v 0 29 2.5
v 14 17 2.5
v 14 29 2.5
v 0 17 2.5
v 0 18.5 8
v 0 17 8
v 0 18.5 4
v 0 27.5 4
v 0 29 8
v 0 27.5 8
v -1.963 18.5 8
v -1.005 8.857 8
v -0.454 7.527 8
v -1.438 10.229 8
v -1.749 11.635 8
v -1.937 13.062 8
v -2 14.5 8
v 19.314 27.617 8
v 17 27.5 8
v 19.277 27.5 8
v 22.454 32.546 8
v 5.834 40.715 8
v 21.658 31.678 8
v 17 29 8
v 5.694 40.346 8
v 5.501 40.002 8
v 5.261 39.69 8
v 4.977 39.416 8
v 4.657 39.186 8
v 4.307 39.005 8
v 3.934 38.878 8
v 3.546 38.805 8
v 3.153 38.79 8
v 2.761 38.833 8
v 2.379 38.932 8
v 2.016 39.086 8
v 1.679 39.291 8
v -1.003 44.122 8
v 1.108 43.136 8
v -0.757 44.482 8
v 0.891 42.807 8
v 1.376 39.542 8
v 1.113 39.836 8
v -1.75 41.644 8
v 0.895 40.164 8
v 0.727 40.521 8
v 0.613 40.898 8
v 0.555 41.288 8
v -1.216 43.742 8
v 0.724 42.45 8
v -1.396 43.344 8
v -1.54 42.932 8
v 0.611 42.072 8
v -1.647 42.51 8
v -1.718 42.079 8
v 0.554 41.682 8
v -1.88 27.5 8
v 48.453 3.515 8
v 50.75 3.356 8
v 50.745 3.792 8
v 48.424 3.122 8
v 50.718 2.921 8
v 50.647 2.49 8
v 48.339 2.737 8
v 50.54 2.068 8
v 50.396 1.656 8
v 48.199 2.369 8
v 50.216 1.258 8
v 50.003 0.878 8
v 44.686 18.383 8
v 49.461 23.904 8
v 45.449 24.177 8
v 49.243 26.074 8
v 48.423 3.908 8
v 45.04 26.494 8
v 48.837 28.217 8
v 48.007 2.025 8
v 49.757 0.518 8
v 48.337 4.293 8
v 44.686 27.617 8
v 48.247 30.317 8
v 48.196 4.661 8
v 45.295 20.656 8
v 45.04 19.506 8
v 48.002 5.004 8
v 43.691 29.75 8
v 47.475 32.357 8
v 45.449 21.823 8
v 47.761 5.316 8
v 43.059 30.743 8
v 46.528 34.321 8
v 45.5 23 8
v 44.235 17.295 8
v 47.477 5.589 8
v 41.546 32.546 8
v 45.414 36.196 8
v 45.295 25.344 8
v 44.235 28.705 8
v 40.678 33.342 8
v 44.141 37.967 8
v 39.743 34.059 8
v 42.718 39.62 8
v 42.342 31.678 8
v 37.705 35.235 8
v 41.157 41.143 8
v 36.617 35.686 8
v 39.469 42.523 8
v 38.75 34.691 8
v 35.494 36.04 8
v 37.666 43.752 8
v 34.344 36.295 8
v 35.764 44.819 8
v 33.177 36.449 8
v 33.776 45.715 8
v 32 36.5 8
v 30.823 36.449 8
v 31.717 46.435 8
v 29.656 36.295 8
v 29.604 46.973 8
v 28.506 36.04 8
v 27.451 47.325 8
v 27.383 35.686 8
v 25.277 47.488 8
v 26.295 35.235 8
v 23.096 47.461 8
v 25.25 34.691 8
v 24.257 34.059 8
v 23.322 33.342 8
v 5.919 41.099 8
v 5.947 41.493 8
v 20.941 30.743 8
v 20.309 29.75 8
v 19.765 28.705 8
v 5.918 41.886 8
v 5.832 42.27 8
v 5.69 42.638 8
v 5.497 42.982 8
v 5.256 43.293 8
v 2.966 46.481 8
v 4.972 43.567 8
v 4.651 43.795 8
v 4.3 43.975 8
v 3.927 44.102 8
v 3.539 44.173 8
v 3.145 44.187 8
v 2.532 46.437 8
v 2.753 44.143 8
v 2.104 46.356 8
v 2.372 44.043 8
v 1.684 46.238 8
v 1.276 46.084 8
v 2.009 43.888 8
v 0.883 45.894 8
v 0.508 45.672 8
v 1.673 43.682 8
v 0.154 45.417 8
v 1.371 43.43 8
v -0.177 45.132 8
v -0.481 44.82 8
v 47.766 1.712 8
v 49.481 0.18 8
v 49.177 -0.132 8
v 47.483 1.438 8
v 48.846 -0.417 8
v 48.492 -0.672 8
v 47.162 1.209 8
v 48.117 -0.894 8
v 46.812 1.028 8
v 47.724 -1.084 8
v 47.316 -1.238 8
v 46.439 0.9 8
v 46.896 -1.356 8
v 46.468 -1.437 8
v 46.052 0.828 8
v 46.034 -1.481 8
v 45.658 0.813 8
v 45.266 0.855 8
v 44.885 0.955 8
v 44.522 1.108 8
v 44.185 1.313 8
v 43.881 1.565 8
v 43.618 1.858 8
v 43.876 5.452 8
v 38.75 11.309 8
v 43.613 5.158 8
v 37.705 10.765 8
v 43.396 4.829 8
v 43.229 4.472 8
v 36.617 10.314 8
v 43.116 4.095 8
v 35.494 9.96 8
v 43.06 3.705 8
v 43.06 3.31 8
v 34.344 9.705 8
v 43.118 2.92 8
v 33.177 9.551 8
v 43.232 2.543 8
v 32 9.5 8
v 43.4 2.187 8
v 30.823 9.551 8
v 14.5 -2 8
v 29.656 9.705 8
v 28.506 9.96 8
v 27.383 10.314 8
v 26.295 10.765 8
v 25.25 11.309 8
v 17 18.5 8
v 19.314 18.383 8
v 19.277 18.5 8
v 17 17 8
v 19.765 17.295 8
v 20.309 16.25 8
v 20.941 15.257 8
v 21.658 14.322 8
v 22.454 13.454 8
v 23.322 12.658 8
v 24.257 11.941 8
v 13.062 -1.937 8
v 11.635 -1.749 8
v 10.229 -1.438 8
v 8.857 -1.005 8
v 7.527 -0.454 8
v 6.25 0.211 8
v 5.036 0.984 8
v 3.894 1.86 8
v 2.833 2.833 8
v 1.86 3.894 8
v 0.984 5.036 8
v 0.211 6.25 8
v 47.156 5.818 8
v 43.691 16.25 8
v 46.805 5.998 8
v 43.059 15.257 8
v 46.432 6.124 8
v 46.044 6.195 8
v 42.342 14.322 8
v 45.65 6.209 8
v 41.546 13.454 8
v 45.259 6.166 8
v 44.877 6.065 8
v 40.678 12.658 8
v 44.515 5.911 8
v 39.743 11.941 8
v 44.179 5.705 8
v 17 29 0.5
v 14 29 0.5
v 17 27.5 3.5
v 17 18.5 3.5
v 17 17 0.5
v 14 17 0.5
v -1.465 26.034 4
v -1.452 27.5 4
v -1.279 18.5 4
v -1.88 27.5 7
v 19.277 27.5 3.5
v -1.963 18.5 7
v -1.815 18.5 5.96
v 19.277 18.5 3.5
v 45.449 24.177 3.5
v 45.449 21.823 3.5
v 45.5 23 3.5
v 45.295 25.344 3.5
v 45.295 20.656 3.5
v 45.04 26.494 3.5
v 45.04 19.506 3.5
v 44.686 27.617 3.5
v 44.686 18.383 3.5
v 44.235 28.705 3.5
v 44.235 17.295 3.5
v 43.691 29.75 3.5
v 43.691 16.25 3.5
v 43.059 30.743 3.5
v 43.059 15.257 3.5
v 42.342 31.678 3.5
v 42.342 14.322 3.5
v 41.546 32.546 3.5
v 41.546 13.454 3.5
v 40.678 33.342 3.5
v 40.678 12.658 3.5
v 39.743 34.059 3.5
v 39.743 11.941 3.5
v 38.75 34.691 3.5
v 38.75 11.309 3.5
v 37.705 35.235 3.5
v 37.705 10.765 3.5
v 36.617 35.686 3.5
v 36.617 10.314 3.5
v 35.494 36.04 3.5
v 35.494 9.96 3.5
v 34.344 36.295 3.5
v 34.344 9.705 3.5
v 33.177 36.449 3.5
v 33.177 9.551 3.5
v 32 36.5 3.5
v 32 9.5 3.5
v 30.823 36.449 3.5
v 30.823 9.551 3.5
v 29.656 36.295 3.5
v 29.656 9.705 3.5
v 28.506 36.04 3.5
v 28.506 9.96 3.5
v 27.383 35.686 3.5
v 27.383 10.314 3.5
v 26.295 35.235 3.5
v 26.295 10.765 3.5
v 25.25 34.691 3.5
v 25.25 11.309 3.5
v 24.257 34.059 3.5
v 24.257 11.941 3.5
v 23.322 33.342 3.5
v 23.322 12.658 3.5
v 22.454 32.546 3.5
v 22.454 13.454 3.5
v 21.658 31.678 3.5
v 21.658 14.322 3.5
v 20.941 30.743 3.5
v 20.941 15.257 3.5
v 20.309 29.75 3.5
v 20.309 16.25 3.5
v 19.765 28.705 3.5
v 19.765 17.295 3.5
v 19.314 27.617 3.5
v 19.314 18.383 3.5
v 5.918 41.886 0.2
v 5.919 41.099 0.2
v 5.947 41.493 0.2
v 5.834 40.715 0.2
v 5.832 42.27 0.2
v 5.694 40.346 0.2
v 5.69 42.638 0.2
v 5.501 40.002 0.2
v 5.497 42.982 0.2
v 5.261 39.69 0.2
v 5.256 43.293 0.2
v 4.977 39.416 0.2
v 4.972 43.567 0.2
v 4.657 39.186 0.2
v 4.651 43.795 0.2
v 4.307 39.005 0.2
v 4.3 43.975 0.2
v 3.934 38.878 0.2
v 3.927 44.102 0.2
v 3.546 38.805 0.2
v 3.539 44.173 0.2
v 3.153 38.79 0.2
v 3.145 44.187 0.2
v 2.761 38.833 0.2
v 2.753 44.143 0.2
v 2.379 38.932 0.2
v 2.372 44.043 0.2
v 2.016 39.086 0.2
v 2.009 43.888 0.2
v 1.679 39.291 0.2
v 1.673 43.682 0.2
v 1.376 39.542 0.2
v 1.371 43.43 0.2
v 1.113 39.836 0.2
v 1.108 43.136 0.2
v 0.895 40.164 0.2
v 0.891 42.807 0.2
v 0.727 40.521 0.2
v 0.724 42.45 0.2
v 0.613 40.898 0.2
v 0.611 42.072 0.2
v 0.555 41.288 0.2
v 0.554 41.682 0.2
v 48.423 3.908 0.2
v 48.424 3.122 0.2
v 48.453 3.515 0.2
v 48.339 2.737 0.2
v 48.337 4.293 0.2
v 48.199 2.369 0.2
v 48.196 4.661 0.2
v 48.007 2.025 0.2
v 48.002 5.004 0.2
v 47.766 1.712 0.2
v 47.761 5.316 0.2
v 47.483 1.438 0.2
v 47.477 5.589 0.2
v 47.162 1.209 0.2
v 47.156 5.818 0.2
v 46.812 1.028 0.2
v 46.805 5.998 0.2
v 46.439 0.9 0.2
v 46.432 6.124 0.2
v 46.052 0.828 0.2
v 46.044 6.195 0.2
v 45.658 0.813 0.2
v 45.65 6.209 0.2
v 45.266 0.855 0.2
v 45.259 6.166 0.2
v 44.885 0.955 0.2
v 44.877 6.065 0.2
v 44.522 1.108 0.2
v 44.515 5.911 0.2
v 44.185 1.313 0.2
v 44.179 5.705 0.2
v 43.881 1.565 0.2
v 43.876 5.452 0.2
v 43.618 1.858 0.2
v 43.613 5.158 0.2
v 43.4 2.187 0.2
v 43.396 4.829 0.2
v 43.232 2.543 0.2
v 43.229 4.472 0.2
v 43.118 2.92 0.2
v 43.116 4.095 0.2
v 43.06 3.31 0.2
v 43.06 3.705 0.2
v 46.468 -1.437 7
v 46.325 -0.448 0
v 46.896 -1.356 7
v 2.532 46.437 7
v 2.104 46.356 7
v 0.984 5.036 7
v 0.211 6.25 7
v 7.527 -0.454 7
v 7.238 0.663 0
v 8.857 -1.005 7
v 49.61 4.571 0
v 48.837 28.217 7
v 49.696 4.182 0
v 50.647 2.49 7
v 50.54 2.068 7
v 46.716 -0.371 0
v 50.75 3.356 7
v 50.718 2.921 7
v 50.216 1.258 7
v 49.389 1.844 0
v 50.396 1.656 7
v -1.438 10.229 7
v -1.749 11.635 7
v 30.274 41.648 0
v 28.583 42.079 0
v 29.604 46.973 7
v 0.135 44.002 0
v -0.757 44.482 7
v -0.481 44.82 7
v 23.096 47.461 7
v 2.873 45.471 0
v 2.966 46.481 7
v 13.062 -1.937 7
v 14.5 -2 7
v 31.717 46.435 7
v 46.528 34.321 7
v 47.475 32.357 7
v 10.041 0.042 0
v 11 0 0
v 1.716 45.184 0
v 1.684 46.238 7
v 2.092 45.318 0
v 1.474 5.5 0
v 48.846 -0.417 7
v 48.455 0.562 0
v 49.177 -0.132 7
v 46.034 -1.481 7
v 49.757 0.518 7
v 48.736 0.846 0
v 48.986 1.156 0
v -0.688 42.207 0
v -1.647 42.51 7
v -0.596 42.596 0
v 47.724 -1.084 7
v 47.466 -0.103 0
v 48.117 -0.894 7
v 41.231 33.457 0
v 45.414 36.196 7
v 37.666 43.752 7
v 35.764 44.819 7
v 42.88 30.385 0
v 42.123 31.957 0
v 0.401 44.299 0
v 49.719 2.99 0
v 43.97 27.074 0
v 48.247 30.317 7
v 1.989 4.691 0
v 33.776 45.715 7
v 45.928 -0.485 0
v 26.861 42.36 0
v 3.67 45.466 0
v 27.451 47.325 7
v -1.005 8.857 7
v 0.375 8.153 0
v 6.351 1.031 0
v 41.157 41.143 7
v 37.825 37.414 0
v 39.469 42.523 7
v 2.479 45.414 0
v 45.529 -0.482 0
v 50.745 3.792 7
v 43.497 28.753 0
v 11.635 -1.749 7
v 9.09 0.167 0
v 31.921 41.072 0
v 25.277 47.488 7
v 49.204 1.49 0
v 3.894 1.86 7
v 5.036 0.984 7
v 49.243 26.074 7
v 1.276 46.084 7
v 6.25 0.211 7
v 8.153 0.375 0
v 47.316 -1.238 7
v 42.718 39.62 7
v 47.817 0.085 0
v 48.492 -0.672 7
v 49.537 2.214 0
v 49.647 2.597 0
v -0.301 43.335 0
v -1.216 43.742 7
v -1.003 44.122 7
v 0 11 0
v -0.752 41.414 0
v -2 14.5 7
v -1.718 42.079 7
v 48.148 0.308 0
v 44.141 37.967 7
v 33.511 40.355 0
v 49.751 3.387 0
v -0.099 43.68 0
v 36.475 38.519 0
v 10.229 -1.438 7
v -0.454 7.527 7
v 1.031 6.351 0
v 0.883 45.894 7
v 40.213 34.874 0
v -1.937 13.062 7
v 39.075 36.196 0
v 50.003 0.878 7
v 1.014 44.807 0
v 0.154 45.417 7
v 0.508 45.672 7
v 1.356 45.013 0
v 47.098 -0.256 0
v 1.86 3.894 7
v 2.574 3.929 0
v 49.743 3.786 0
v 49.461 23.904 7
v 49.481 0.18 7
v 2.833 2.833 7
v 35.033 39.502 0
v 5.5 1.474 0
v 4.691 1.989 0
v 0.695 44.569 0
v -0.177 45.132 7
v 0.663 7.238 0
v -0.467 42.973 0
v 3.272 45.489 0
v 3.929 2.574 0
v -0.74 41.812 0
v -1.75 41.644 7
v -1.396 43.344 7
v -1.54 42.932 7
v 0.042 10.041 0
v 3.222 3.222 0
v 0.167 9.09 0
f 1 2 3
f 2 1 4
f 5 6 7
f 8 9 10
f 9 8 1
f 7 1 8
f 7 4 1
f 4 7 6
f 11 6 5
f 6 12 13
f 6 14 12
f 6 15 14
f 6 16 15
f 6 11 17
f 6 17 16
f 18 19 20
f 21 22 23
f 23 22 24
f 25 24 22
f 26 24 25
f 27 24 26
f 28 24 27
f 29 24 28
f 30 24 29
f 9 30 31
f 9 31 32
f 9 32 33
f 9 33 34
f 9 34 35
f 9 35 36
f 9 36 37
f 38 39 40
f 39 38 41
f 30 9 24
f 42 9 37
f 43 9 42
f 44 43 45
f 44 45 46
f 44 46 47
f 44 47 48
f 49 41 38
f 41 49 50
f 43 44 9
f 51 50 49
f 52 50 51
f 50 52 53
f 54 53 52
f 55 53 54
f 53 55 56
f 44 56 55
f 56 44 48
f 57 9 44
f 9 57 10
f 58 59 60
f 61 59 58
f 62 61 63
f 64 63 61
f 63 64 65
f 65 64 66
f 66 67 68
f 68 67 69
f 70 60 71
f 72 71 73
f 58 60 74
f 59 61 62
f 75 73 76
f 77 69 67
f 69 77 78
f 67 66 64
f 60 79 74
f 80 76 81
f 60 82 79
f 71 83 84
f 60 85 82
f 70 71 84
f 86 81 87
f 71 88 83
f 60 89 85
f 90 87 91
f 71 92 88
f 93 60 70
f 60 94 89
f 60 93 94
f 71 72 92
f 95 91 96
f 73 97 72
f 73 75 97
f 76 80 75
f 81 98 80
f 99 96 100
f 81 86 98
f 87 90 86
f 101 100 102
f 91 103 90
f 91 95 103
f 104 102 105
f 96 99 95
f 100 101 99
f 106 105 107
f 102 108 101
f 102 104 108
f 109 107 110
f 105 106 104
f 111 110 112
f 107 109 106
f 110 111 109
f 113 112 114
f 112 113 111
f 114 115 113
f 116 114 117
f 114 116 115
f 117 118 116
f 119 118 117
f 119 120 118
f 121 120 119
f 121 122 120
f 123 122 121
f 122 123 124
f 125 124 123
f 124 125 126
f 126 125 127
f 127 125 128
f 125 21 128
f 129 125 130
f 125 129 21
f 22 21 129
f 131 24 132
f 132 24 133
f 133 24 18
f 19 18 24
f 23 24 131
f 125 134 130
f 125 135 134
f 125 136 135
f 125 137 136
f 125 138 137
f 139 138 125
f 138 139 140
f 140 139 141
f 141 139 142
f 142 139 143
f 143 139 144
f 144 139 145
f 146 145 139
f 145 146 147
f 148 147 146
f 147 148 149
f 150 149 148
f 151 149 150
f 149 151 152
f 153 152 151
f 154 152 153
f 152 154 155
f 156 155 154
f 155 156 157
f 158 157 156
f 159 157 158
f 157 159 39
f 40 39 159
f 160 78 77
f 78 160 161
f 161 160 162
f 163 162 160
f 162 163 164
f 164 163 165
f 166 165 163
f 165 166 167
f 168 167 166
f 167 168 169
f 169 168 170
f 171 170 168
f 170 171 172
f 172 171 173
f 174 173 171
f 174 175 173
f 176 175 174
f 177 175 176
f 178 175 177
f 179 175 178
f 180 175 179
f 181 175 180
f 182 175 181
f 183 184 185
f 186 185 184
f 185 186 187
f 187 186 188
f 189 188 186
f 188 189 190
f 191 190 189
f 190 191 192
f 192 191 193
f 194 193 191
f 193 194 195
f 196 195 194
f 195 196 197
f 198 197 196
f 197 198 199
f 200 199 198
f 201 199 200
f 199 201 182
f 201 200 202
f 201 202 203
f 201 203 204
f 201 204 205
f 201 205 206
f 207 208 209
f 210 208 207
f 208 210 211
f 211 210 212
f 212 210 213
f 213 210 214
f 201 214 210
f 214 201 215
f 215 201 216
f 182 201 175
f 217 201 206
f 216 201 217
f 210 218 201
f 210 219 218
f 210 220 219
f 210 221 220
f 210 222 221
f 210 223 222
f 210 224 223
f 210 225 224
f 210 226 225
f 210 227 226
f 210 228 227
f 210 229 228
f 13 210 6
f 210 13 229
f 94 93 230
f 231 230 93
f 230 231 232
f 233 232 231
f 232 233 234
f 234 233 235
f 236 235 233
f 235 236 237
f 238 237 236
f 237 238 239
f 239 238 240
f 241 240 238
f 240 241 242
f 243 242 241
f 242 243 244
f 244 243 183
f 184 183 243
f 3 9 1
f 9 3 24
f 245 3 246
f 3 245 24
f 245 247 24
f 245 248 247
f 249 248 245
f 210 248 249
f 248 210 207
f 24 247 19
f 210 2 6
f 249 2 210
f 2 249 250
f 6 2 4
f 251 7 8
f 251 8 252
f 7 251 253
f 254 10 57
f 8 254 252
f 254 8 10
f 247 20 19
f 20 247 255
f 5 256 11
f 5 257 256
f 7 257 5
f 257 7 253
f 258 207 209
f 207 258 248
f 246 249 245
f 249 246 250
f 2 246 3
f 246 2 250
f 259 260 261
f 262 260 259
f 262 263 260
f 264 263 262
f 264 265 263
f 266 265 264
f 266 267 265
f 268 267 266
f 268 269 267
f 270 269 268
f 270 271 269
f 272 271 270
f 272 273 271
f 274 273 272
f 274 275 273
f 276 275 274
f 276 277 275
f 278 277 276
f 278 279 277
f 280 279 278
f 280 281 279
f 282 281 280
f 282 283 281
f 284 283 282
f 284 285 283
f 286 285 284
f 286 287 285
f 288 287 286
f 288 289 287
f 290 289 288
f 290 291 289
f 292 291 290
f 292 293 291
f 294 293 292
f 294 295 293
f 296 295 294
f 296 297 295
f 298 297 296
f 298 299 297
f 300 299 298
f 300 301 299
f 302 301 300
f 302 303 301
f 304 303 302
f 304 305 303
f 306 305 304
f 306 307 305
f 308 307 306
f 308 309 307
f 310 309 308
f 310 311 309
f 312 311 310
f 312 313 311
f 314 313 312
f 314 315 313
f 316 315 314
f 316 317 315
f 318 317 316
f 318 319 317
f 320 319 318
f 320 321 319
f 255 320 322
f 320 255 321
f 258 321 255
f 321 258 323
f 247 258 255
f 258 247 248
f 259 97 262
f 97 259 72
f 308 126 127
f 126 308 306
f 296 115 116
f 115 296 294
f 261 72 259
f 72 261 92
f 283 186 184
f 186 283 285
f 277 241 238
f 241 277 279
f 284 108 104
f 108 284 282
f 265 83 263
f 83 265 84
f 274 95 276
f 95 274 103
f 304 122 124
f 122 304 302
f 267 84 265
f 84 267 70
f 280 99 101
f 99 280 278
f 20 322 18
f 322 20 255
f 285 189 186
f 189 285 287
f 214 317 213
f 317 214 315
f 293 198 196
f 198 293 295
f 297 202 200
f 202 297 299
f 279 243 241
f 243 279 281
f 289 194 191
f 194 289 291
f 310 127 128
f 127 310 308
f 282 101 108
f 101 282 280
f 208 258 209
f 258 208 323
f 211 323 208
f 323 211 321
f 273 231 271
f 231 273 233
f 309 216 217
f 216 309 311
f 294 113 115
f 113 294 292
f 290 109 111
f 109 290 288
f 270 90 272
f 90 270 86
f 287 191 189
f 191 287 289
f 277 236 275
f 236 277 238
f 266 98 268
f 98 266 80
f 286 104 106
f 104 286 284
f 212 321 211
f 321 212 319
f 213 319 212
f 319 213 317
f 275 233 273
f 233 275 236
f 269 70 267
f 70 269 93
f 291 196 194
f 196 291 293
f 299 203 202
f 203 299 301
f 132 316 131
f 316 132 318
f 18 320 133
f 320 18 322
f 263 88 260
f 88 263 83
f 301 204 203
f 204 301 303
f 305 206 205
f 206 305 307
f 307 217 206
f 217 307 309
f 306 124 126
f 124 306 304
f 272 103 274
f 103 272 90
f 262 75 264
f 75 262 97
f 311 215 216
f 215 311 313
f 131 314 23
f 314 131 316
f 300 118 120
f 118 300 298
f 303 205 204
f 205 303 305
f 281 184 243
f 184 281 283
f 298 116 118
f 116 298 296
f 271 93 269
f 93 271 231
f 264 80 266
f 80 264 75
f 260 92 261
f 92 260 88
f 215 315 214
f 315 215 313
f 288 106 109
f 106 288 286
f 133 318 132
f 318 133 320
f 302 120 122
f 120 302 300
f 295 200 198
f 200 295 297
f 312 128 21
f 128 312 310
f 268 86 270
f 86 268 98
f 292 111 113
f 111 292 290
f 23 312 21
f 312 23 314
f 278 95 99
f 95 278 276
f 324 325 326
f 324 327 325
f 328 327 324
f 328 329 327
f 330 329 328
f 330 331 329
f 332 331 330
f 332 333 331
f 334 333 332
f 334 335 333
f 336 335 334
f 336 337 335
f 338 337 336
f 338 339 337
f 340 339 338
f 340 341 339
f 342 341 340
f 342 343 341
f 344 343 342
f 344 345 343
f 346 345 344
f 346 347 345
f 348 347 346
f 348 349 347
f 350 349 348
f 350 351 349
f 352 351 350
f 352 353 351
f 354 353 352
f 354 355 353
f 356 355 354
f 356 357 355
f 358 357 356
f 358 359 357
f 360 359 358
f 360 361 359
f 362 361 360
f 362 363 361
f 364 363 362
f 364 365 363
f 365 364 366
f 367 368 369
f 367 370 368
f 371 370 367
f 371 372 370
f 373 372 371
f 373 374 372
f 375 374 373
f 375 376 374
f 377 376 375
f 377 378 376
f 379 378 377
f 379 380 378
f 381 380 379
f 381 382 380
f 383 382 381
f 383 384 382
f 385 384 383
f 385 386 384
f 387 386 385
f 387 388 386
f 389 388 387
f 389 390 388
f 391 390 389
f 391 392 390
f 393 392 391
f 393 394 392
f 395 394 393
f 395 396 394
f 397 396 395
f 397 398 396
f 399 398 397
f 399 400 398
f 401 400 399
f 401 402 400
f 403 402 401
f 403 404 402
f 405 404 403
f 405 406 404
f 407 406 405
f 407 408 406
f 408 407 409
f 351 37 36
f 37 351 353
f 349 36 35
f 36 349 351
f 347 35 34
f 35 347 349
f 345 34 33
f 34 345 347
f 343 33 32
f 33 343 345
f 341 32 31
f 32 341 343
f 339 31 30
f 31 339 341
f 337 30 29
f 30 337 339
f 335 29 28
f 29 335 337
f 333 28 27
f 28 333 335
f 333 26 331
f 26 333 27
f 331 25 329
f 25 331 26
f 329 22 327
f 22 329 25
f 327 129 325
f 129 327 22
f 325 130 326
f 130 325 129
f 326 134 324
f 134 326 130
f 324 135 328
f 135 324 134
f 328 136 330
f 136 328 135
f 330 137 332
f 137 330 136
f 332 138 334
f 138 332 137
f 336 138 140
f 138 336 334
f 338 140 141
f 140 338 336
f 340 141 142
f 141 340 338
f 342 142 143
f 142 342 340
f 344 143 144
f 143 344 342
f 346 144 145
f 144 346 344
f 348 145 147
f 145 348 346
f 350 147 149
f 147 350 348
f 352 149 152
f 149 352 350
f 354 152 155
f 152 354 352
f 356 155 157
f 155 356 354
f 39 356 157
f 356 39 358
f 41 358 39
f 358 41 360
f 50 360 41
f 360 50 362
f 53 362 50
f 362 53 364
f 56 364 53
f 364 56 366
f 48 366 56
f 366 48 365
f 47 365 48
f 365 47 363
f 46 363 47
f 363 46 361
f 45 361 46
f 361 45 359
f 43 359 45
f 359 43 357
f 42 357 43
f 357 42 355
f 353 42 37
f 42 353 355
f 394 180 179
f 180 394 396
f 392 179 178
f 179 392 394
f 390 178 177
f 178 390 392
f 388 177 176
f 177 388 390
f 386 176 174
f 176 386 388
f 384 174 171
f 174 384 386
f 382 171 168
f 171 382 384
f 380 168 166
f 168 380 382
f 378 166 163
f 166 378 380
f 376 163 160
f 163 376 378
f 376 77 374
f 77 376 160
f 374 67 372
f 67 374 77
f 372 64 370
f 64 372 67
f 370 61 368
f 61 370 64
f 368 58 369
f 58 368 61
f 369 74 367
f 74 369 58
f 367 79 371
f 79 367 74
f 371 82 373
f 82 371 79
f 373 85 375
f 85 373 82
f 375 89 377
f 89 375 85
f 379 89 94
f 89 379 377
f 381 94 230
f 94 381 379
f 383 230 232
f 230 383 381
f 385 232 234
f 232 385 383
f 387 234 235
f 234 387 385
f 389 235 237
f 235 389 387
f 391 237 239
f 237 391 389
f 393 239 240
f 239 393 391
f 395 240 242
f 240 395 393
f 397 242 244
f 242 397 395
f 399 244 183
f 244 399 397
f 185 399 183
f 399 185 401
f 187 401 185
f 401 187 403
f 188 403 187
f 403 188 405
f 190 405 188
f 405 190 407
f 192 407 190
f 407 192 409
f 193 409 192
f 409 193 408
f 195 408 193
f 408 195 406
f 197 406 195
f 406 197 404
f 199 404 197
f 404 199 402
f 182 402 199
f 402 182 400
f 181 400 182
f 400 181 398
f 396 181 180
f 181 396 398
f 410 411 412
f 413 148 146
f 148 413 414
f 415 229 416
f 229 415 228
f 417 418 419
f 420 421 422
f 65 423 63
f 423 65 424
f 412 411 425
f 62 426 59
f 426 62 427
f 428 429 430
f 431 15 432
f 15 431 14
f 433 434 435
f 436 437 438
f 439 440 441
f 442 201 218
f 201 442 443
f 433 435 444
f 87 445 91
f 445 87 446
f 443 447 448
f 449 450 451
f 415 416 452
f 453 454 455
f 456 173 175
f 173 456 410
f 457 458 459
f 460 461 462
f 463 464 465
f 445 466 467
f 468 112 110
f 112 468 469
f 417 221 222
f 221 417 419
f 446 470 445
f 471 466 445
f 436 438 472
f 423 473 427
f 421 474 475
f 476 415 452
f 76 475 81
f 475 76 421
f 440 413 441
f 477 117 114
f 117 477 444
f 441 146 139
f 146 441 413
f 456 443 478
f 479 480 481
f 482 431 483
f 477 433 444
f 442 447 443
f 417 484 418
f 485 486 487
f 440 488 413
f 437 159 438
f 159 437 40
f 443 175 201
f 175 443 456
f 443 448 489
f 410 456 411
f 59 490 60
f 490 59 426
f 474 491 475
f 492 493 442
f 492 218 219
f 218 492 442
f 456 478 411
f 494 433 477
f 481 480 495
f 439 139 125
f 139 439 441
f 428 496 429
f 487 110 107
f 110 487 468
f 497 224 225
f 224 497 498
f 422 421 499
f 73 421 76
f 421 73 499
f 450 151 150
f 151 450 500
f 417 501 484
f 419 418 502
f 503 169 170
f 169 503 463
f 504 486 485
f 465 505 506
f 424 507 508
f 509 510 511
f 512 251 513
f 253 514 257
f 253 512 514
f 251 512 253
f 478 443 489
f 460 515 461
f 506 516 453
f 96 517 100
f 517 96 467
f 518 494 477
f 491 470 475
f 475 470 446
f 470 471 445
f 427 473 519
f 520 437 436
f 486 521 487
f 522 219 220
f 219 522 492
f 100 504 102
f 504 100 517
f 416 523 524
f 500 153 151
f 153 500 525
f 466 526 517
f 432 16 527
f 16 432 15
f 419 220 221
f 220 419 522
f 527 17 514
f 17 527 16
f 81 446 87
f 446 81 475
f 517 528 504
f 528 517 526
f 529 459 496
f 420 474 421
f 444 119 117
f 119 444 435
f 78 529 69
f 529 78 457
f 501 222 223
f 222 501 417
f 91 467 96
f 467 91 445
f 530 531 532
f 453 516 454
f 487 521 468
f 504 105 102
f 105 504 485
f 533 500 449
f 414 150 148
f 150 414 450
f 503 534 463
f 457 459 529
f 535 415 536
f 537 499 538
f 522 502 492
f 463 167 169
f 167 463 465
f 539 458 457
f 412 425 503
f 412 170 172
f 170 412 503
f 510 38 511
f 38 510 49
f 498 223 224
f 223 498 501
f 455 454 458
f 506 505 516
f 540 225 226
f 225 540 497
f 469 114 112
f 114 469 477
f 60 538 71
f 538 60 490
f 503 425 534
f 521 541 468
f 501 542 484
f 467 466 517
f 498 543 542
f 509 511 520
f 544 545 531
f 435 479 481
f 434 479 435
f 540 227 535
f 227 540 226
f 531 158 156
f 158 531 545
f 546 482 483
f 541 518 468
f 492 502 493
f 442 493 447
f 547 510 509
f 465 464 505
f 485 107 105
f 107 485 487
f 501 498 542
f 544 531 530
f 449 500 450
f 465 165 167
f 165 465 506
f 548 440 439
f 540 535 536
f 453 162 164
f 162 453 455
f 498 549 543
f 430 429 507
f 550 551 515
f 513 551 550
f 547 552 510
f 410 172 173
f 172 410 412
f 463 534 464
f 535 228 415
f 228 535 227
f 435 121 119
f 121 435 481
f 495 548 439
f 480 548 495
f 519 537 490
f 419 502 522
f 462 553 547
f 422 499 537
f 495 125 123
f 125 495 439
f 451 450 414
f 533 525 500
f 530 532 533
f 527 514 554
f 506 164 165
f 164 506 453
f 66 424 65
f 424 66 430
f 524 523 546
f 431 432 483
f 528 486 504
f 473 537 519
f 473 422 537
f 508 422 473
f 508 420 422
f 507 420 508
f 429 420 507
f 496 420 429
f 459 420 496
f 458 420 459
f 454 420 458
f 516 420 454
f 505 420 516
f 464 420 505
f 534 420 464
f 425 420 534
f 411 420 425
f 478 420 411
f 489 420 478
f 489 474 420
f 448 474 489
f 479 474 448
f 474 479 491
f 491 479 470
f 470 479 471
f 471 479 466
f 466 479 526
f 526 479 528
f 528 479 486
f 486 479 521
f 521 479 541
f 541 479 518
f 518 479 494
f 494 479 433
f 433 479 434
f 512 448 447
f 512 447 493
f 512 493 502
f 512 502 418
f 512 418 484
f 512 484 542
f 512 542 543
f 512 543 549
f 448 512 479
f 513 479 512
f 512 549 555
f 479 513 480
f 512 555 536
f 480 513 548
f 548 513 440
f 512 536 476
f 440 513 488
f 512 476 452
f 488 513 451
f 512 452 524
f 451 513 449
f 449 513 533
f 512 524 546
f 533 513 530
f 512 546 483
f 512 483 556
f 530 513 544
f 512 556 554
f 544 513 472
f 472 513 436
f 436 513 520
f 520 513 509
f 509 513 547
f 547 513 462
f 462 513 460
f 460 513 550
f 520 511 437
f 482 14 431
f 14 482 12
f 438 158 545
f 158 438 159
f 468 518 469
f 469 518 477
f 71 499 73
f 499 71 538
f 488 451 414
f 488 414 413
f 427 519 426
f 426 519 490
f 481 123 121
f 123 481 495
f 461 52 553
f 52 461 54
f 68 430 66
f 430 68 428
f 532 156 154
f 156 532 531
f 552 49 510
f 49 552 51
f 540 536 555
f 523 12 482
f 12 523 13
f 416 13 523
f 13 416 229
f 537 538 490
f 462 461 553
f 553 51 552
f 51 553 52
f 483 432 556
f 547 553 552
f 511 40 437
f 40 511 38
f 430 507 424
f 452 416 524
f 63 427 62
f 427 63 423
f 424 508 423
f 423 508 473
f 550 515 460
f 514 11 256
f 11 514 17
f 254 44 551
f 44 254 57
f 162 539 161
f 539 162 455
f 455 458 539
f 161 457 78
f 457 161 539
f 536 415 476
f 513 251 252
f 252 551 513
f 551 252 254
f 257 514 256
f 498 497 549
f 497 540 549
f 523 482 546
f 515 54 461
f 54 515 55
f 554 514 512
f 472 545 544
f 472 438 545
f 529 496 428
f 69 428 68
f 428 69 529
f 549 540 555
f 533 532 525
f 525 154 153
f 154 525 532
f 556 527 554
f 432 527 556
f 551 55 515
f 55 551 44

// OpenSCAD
//$fn=60;
$fa=5;
$fs=.4;

partHeigh = 8;

offsetX = 24.5;
offsetY = 22.5;

insertDia = 5.4;
insertOutherDia = 10;

difference(){
    hull(){
        translate([0,0,partHeigh-1]) body1();
        body2();
    }
    union(){
        holle1();
        holle2();
    }
}


module body1(){
    linear_extrude(height=1) union(){
        translate([offsetX,offsetY]) rotate([0,0,-41.78]) difference(){
            circle(d=50);
            translate([0,-25/2]) square([50,25],center=true);
        }

        hull(){
            translate([14.5,14.5]) circle(d=33);
            translate([offsetX,offsetY]) rotate([0,0,-41.78]) hull(){
                translate([-57/2,0]) circle(d=insertOutherDia);
                translate([57/2,0]) circle(d=insertOutherDia);
            }
        }
    }
}

module body2(){
    linear_extrude(height=1) union(){
        translate([offsetX,offsetY]) rotate([0,0,-41.78]) difference(){
            circle(d=40);
            translate([0,-25/2]) square([50,25],center=true);
        }

        hull(){
            translate([11,11]) circle(d=22);
            translate([offsetX,offsetY]) rotate([0,0,-41.78]) hull(){
                translate([-57/2,0]) circle(d=insertOutherDia-2);
                translate([57/2,0]) circle(d=insertOutherDia-2);
            }
        }
    }
}

module holle1(){
    translate([0,0,0.2])
    linear_extrude(height=10)
    translate([offsetX,offsetY]) rotate([0,0,-41.78]) union(){
        translate([-57/2,0]) circle(d=insertDia);
        translate([57/2,0]) circle(d=insertDia);
    }
}

module holle2(){
    convertorHeight = 5.5;
    
    translate([0,offsetY-5.5,partHeigh-convertorHeight])
    union(){    
        linear_extrude(height=convertorHeight) square([17,12],center=false);
        
        translate([-2,(12-9)/2,1.5]) 
        linear_extrude(height=convertorHeight-1.5) square([3,9],center=false);
        
        translate([17-3,0,-2])
        linear_extrude(height=2) square([3,12],center=false);
        
        translate([0,(12-9)/2,1]) 
        linear_extrude(height=convertorHeight-1) square([40,9],center=false);
        
        translate([32,12/2,1]) 
        linear_extrude(height=convertorHeight-1) circle(d=27);
        
        /*
        translate([0,(12-9)/2,3]) 
        linear_extrude(height=convertorHeight-2) square([60,4],center=false);
        */
        
    }
    
}
